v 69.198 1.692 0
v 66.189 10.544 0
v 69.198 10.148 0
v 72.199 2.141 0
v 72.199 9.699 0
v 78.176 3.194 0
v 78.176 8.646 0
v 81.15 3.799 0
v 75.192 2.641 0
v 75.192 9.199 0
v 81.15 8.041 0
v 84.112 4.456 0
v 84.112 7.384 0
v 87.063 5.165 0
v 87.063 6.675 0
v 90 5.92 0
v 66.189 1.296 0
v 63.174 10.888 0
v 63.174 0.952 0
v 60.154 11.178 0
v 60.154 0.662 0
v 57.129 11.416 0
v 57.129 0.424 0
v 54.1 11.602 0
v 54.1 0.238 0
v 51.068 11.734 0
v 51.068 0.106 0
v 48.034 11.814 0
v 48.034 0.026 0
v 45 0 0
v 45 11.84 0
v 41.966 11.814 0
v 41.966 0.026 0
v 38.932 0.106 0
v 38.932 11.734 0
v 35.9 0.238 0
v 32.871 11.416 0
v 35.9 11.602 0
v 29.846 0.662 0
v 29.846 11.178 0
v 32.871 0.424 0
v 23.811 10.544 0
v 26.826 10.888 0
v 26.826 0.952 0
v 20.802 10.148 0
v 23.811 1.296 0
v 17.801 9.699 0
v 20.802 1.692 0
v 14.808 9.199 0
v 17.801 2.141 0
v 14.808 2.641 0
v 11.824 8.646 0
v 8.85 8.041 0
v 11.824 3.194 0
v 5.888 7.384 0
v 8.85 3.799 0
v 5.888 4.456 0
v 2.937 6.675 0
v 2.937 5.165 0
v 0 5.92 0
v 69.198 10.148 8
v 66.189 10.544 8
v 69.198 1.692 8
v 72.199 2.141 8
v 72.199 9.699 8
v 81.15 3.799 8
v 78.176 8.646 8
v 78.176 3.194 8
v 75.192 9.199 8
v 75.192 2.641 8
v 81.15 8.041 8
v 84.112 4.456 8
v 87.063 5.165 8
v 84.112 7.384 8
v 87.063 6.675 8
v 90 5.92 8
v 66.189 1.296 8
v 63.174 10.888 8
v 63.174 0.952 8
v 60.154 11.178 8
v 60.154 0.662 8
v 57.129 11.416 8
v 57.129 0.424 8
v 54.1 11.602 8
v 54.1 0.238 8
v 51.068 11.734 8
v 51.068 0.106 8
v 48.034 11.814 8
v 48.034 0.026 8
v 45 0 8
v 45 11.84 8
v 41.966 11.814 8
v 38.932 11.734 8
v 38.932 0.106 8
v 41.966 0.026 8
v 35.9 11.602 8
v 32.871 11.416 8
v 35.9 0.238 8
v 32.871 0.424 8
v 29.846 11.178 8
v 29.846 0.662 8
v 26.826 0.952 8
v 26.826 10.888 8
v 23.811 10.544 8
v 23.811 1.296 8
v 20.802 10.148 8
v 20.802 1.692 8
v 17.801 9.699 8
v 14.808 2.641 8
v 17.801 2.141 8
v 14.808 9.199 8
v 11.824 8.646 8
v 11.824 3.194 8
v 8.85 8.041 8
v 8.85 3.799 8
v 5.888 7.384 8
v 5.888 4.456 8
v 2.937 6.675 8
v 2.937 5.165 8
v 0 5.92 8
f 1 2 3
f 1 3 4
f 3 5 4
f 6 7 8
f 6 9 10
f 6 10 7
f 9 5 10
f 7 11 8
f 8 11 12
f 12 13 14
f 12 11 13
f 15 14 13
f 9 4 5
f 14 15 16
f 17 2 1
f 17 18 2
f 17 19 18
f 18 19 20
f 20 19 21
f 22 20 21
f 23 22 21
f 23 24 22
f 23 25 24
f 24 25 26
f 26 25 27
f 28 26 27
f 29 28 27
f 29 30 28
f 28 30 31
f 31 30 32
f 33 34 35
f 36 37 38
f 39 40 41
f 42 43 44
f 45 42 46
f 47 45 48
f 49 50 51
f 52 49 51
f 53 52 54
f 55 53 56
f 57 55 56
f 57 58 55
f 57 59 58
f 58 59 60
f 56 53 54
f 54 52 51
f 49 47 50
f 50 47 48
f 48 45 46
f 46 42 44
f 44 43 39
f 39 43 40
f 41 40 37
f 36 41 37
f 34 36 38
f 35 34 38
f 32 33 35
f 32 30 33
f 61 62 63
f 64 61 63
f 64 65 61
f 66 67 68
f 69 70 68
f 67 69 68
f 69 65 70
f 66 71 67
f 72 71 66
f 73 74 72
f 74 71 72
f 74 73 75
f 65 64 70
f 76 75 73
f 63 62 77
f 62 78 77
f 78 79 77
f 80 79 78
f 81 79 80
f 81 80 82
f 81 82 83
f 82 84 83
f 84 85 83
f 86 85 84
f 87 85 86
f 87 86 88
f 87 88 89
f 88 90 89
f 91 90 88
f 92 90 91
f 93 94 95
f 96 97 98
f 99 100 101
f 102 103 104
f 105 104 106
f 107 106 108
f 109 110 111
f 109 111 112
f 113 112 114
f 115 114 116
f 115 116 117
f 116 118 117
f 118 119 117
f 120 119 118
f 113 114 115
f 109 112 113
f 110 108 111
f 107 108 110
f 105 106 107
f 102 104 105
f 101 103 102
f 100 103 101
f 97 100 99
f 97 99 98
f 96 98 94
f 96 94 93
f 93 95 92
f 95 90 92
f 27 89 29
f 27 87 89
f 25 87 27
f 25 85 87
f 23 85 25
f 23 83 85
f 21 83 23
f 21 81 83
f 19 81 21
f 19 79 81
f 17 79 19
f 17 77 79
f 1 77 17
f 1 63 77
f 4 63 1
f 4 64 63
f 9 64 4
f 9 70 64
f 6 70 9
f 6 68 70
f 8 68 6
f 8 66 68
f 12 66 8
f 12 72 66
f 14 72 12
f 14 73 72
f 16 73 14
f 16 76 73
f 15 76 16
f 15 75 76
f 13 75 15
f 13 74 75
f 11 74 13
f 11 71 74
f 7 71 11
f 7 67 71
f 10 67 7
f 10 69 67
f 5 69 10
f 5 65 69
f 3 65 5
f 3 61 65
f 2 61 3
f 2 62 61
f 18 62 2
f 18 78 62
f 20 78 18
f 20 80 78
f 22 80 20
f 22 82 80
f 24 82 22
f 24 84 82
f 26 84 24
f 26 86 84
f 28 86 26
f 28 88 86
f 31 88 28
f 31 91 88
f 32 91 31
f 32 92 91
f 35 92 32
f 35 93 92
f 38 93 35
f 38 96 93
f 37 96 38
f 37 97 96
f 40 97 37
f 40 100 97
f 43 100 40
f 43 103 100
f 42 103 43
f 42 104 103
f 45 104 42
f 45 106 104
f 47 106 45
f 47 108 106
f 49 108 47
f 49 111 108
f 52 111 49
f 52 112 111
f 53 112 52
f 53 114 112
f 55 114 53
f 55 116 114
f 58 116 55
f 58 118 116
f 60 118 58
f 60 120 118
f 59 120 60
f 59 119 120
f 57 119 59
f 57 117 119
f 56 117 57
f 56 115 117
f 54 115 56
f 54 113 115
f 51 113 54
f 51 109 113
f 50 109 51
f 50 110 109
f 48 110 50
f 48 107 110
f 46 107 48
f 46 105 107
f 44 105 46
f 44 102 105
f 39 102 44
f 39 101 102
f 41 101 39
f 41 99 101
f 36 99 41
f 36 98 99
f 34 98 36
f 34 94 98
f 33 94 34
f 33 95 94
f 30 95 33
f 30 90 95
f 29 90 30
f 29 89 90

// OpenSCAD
$fn = 32;

// ----------------------------------------------------------------------
// Arc profile plate: lens, 60 points
// ----------------------------------------------------------------------

// --- parameters (mm) ---
lens_chord = 90;          // chord length of the lens, X
arc_r = 173.87;           // radius of both arcs
arc_angle = 30;           // angle of each arc, degrees
sagitta = 5.92;           // bulge of each arc (half the lens height)
arc_step = 1;             // sampling step of the arcs, degrees
plate_t = 8;              // plate thickness, Z

bbox_y = 2 * sagitta;  // full lens height

profile = [[90, 5.92], [87.063, 6.675], [84.112, 7.384], [81.15, 8.041], [78.176, 8.646], [75.192, 9.199], [72.199, 9.699], [69.198, 10.148], [66.189, 10.544], [63.174, 10.888], [60.154, 11.178], [57.129, 11.416], [54.1, 11.602], [51.068, 11.734], [48.034, 11.814], [45, 11.84], [41.966, 11.814], [38.932, 11.734], [35.9, 11.602], [32.871, 11.416], [29.846, 11.178], [26.826, 10.888], [23.811, 10.544], [20.802, 10.148], [17.801, 9.699], [14.808, 9.199], [11.824, 8.646], [8.85, 8.041], [5.888, 7.384], [2.937, 6.675], [0, 5.92], [2.937, 5.165], [5.888, 4.456], [8.85, 3.799], [11.824, 3.194], [14.808, 2.641], [17.801, 2.141], [20.802, 1.692], [23.811, 1.296], [26.826, 0.952], [29.846, 0.662], [32.871, 0.424], [35.9, 0.238], [38.932, 0.106], [41.966, 0.026], [45, 0], [48.034, 0.026], [51.068, 0.106], [54.1, 0.238], [57.129, 0.424], [60.154, 0.662], [63.174, 0.952], [66.189, 1.296], [69.198, 1.692], [72.199, 2.141], [75.192, 2.641], [78.176, 3.194], [81.15, 3.799], [84.112, 4.456], [87.063, 5.165]];  // primary outline, 60 points, counter clockwise

// --- the one profile operation ---
linear_extrude(height = plate_t) polygon(points = profile);
